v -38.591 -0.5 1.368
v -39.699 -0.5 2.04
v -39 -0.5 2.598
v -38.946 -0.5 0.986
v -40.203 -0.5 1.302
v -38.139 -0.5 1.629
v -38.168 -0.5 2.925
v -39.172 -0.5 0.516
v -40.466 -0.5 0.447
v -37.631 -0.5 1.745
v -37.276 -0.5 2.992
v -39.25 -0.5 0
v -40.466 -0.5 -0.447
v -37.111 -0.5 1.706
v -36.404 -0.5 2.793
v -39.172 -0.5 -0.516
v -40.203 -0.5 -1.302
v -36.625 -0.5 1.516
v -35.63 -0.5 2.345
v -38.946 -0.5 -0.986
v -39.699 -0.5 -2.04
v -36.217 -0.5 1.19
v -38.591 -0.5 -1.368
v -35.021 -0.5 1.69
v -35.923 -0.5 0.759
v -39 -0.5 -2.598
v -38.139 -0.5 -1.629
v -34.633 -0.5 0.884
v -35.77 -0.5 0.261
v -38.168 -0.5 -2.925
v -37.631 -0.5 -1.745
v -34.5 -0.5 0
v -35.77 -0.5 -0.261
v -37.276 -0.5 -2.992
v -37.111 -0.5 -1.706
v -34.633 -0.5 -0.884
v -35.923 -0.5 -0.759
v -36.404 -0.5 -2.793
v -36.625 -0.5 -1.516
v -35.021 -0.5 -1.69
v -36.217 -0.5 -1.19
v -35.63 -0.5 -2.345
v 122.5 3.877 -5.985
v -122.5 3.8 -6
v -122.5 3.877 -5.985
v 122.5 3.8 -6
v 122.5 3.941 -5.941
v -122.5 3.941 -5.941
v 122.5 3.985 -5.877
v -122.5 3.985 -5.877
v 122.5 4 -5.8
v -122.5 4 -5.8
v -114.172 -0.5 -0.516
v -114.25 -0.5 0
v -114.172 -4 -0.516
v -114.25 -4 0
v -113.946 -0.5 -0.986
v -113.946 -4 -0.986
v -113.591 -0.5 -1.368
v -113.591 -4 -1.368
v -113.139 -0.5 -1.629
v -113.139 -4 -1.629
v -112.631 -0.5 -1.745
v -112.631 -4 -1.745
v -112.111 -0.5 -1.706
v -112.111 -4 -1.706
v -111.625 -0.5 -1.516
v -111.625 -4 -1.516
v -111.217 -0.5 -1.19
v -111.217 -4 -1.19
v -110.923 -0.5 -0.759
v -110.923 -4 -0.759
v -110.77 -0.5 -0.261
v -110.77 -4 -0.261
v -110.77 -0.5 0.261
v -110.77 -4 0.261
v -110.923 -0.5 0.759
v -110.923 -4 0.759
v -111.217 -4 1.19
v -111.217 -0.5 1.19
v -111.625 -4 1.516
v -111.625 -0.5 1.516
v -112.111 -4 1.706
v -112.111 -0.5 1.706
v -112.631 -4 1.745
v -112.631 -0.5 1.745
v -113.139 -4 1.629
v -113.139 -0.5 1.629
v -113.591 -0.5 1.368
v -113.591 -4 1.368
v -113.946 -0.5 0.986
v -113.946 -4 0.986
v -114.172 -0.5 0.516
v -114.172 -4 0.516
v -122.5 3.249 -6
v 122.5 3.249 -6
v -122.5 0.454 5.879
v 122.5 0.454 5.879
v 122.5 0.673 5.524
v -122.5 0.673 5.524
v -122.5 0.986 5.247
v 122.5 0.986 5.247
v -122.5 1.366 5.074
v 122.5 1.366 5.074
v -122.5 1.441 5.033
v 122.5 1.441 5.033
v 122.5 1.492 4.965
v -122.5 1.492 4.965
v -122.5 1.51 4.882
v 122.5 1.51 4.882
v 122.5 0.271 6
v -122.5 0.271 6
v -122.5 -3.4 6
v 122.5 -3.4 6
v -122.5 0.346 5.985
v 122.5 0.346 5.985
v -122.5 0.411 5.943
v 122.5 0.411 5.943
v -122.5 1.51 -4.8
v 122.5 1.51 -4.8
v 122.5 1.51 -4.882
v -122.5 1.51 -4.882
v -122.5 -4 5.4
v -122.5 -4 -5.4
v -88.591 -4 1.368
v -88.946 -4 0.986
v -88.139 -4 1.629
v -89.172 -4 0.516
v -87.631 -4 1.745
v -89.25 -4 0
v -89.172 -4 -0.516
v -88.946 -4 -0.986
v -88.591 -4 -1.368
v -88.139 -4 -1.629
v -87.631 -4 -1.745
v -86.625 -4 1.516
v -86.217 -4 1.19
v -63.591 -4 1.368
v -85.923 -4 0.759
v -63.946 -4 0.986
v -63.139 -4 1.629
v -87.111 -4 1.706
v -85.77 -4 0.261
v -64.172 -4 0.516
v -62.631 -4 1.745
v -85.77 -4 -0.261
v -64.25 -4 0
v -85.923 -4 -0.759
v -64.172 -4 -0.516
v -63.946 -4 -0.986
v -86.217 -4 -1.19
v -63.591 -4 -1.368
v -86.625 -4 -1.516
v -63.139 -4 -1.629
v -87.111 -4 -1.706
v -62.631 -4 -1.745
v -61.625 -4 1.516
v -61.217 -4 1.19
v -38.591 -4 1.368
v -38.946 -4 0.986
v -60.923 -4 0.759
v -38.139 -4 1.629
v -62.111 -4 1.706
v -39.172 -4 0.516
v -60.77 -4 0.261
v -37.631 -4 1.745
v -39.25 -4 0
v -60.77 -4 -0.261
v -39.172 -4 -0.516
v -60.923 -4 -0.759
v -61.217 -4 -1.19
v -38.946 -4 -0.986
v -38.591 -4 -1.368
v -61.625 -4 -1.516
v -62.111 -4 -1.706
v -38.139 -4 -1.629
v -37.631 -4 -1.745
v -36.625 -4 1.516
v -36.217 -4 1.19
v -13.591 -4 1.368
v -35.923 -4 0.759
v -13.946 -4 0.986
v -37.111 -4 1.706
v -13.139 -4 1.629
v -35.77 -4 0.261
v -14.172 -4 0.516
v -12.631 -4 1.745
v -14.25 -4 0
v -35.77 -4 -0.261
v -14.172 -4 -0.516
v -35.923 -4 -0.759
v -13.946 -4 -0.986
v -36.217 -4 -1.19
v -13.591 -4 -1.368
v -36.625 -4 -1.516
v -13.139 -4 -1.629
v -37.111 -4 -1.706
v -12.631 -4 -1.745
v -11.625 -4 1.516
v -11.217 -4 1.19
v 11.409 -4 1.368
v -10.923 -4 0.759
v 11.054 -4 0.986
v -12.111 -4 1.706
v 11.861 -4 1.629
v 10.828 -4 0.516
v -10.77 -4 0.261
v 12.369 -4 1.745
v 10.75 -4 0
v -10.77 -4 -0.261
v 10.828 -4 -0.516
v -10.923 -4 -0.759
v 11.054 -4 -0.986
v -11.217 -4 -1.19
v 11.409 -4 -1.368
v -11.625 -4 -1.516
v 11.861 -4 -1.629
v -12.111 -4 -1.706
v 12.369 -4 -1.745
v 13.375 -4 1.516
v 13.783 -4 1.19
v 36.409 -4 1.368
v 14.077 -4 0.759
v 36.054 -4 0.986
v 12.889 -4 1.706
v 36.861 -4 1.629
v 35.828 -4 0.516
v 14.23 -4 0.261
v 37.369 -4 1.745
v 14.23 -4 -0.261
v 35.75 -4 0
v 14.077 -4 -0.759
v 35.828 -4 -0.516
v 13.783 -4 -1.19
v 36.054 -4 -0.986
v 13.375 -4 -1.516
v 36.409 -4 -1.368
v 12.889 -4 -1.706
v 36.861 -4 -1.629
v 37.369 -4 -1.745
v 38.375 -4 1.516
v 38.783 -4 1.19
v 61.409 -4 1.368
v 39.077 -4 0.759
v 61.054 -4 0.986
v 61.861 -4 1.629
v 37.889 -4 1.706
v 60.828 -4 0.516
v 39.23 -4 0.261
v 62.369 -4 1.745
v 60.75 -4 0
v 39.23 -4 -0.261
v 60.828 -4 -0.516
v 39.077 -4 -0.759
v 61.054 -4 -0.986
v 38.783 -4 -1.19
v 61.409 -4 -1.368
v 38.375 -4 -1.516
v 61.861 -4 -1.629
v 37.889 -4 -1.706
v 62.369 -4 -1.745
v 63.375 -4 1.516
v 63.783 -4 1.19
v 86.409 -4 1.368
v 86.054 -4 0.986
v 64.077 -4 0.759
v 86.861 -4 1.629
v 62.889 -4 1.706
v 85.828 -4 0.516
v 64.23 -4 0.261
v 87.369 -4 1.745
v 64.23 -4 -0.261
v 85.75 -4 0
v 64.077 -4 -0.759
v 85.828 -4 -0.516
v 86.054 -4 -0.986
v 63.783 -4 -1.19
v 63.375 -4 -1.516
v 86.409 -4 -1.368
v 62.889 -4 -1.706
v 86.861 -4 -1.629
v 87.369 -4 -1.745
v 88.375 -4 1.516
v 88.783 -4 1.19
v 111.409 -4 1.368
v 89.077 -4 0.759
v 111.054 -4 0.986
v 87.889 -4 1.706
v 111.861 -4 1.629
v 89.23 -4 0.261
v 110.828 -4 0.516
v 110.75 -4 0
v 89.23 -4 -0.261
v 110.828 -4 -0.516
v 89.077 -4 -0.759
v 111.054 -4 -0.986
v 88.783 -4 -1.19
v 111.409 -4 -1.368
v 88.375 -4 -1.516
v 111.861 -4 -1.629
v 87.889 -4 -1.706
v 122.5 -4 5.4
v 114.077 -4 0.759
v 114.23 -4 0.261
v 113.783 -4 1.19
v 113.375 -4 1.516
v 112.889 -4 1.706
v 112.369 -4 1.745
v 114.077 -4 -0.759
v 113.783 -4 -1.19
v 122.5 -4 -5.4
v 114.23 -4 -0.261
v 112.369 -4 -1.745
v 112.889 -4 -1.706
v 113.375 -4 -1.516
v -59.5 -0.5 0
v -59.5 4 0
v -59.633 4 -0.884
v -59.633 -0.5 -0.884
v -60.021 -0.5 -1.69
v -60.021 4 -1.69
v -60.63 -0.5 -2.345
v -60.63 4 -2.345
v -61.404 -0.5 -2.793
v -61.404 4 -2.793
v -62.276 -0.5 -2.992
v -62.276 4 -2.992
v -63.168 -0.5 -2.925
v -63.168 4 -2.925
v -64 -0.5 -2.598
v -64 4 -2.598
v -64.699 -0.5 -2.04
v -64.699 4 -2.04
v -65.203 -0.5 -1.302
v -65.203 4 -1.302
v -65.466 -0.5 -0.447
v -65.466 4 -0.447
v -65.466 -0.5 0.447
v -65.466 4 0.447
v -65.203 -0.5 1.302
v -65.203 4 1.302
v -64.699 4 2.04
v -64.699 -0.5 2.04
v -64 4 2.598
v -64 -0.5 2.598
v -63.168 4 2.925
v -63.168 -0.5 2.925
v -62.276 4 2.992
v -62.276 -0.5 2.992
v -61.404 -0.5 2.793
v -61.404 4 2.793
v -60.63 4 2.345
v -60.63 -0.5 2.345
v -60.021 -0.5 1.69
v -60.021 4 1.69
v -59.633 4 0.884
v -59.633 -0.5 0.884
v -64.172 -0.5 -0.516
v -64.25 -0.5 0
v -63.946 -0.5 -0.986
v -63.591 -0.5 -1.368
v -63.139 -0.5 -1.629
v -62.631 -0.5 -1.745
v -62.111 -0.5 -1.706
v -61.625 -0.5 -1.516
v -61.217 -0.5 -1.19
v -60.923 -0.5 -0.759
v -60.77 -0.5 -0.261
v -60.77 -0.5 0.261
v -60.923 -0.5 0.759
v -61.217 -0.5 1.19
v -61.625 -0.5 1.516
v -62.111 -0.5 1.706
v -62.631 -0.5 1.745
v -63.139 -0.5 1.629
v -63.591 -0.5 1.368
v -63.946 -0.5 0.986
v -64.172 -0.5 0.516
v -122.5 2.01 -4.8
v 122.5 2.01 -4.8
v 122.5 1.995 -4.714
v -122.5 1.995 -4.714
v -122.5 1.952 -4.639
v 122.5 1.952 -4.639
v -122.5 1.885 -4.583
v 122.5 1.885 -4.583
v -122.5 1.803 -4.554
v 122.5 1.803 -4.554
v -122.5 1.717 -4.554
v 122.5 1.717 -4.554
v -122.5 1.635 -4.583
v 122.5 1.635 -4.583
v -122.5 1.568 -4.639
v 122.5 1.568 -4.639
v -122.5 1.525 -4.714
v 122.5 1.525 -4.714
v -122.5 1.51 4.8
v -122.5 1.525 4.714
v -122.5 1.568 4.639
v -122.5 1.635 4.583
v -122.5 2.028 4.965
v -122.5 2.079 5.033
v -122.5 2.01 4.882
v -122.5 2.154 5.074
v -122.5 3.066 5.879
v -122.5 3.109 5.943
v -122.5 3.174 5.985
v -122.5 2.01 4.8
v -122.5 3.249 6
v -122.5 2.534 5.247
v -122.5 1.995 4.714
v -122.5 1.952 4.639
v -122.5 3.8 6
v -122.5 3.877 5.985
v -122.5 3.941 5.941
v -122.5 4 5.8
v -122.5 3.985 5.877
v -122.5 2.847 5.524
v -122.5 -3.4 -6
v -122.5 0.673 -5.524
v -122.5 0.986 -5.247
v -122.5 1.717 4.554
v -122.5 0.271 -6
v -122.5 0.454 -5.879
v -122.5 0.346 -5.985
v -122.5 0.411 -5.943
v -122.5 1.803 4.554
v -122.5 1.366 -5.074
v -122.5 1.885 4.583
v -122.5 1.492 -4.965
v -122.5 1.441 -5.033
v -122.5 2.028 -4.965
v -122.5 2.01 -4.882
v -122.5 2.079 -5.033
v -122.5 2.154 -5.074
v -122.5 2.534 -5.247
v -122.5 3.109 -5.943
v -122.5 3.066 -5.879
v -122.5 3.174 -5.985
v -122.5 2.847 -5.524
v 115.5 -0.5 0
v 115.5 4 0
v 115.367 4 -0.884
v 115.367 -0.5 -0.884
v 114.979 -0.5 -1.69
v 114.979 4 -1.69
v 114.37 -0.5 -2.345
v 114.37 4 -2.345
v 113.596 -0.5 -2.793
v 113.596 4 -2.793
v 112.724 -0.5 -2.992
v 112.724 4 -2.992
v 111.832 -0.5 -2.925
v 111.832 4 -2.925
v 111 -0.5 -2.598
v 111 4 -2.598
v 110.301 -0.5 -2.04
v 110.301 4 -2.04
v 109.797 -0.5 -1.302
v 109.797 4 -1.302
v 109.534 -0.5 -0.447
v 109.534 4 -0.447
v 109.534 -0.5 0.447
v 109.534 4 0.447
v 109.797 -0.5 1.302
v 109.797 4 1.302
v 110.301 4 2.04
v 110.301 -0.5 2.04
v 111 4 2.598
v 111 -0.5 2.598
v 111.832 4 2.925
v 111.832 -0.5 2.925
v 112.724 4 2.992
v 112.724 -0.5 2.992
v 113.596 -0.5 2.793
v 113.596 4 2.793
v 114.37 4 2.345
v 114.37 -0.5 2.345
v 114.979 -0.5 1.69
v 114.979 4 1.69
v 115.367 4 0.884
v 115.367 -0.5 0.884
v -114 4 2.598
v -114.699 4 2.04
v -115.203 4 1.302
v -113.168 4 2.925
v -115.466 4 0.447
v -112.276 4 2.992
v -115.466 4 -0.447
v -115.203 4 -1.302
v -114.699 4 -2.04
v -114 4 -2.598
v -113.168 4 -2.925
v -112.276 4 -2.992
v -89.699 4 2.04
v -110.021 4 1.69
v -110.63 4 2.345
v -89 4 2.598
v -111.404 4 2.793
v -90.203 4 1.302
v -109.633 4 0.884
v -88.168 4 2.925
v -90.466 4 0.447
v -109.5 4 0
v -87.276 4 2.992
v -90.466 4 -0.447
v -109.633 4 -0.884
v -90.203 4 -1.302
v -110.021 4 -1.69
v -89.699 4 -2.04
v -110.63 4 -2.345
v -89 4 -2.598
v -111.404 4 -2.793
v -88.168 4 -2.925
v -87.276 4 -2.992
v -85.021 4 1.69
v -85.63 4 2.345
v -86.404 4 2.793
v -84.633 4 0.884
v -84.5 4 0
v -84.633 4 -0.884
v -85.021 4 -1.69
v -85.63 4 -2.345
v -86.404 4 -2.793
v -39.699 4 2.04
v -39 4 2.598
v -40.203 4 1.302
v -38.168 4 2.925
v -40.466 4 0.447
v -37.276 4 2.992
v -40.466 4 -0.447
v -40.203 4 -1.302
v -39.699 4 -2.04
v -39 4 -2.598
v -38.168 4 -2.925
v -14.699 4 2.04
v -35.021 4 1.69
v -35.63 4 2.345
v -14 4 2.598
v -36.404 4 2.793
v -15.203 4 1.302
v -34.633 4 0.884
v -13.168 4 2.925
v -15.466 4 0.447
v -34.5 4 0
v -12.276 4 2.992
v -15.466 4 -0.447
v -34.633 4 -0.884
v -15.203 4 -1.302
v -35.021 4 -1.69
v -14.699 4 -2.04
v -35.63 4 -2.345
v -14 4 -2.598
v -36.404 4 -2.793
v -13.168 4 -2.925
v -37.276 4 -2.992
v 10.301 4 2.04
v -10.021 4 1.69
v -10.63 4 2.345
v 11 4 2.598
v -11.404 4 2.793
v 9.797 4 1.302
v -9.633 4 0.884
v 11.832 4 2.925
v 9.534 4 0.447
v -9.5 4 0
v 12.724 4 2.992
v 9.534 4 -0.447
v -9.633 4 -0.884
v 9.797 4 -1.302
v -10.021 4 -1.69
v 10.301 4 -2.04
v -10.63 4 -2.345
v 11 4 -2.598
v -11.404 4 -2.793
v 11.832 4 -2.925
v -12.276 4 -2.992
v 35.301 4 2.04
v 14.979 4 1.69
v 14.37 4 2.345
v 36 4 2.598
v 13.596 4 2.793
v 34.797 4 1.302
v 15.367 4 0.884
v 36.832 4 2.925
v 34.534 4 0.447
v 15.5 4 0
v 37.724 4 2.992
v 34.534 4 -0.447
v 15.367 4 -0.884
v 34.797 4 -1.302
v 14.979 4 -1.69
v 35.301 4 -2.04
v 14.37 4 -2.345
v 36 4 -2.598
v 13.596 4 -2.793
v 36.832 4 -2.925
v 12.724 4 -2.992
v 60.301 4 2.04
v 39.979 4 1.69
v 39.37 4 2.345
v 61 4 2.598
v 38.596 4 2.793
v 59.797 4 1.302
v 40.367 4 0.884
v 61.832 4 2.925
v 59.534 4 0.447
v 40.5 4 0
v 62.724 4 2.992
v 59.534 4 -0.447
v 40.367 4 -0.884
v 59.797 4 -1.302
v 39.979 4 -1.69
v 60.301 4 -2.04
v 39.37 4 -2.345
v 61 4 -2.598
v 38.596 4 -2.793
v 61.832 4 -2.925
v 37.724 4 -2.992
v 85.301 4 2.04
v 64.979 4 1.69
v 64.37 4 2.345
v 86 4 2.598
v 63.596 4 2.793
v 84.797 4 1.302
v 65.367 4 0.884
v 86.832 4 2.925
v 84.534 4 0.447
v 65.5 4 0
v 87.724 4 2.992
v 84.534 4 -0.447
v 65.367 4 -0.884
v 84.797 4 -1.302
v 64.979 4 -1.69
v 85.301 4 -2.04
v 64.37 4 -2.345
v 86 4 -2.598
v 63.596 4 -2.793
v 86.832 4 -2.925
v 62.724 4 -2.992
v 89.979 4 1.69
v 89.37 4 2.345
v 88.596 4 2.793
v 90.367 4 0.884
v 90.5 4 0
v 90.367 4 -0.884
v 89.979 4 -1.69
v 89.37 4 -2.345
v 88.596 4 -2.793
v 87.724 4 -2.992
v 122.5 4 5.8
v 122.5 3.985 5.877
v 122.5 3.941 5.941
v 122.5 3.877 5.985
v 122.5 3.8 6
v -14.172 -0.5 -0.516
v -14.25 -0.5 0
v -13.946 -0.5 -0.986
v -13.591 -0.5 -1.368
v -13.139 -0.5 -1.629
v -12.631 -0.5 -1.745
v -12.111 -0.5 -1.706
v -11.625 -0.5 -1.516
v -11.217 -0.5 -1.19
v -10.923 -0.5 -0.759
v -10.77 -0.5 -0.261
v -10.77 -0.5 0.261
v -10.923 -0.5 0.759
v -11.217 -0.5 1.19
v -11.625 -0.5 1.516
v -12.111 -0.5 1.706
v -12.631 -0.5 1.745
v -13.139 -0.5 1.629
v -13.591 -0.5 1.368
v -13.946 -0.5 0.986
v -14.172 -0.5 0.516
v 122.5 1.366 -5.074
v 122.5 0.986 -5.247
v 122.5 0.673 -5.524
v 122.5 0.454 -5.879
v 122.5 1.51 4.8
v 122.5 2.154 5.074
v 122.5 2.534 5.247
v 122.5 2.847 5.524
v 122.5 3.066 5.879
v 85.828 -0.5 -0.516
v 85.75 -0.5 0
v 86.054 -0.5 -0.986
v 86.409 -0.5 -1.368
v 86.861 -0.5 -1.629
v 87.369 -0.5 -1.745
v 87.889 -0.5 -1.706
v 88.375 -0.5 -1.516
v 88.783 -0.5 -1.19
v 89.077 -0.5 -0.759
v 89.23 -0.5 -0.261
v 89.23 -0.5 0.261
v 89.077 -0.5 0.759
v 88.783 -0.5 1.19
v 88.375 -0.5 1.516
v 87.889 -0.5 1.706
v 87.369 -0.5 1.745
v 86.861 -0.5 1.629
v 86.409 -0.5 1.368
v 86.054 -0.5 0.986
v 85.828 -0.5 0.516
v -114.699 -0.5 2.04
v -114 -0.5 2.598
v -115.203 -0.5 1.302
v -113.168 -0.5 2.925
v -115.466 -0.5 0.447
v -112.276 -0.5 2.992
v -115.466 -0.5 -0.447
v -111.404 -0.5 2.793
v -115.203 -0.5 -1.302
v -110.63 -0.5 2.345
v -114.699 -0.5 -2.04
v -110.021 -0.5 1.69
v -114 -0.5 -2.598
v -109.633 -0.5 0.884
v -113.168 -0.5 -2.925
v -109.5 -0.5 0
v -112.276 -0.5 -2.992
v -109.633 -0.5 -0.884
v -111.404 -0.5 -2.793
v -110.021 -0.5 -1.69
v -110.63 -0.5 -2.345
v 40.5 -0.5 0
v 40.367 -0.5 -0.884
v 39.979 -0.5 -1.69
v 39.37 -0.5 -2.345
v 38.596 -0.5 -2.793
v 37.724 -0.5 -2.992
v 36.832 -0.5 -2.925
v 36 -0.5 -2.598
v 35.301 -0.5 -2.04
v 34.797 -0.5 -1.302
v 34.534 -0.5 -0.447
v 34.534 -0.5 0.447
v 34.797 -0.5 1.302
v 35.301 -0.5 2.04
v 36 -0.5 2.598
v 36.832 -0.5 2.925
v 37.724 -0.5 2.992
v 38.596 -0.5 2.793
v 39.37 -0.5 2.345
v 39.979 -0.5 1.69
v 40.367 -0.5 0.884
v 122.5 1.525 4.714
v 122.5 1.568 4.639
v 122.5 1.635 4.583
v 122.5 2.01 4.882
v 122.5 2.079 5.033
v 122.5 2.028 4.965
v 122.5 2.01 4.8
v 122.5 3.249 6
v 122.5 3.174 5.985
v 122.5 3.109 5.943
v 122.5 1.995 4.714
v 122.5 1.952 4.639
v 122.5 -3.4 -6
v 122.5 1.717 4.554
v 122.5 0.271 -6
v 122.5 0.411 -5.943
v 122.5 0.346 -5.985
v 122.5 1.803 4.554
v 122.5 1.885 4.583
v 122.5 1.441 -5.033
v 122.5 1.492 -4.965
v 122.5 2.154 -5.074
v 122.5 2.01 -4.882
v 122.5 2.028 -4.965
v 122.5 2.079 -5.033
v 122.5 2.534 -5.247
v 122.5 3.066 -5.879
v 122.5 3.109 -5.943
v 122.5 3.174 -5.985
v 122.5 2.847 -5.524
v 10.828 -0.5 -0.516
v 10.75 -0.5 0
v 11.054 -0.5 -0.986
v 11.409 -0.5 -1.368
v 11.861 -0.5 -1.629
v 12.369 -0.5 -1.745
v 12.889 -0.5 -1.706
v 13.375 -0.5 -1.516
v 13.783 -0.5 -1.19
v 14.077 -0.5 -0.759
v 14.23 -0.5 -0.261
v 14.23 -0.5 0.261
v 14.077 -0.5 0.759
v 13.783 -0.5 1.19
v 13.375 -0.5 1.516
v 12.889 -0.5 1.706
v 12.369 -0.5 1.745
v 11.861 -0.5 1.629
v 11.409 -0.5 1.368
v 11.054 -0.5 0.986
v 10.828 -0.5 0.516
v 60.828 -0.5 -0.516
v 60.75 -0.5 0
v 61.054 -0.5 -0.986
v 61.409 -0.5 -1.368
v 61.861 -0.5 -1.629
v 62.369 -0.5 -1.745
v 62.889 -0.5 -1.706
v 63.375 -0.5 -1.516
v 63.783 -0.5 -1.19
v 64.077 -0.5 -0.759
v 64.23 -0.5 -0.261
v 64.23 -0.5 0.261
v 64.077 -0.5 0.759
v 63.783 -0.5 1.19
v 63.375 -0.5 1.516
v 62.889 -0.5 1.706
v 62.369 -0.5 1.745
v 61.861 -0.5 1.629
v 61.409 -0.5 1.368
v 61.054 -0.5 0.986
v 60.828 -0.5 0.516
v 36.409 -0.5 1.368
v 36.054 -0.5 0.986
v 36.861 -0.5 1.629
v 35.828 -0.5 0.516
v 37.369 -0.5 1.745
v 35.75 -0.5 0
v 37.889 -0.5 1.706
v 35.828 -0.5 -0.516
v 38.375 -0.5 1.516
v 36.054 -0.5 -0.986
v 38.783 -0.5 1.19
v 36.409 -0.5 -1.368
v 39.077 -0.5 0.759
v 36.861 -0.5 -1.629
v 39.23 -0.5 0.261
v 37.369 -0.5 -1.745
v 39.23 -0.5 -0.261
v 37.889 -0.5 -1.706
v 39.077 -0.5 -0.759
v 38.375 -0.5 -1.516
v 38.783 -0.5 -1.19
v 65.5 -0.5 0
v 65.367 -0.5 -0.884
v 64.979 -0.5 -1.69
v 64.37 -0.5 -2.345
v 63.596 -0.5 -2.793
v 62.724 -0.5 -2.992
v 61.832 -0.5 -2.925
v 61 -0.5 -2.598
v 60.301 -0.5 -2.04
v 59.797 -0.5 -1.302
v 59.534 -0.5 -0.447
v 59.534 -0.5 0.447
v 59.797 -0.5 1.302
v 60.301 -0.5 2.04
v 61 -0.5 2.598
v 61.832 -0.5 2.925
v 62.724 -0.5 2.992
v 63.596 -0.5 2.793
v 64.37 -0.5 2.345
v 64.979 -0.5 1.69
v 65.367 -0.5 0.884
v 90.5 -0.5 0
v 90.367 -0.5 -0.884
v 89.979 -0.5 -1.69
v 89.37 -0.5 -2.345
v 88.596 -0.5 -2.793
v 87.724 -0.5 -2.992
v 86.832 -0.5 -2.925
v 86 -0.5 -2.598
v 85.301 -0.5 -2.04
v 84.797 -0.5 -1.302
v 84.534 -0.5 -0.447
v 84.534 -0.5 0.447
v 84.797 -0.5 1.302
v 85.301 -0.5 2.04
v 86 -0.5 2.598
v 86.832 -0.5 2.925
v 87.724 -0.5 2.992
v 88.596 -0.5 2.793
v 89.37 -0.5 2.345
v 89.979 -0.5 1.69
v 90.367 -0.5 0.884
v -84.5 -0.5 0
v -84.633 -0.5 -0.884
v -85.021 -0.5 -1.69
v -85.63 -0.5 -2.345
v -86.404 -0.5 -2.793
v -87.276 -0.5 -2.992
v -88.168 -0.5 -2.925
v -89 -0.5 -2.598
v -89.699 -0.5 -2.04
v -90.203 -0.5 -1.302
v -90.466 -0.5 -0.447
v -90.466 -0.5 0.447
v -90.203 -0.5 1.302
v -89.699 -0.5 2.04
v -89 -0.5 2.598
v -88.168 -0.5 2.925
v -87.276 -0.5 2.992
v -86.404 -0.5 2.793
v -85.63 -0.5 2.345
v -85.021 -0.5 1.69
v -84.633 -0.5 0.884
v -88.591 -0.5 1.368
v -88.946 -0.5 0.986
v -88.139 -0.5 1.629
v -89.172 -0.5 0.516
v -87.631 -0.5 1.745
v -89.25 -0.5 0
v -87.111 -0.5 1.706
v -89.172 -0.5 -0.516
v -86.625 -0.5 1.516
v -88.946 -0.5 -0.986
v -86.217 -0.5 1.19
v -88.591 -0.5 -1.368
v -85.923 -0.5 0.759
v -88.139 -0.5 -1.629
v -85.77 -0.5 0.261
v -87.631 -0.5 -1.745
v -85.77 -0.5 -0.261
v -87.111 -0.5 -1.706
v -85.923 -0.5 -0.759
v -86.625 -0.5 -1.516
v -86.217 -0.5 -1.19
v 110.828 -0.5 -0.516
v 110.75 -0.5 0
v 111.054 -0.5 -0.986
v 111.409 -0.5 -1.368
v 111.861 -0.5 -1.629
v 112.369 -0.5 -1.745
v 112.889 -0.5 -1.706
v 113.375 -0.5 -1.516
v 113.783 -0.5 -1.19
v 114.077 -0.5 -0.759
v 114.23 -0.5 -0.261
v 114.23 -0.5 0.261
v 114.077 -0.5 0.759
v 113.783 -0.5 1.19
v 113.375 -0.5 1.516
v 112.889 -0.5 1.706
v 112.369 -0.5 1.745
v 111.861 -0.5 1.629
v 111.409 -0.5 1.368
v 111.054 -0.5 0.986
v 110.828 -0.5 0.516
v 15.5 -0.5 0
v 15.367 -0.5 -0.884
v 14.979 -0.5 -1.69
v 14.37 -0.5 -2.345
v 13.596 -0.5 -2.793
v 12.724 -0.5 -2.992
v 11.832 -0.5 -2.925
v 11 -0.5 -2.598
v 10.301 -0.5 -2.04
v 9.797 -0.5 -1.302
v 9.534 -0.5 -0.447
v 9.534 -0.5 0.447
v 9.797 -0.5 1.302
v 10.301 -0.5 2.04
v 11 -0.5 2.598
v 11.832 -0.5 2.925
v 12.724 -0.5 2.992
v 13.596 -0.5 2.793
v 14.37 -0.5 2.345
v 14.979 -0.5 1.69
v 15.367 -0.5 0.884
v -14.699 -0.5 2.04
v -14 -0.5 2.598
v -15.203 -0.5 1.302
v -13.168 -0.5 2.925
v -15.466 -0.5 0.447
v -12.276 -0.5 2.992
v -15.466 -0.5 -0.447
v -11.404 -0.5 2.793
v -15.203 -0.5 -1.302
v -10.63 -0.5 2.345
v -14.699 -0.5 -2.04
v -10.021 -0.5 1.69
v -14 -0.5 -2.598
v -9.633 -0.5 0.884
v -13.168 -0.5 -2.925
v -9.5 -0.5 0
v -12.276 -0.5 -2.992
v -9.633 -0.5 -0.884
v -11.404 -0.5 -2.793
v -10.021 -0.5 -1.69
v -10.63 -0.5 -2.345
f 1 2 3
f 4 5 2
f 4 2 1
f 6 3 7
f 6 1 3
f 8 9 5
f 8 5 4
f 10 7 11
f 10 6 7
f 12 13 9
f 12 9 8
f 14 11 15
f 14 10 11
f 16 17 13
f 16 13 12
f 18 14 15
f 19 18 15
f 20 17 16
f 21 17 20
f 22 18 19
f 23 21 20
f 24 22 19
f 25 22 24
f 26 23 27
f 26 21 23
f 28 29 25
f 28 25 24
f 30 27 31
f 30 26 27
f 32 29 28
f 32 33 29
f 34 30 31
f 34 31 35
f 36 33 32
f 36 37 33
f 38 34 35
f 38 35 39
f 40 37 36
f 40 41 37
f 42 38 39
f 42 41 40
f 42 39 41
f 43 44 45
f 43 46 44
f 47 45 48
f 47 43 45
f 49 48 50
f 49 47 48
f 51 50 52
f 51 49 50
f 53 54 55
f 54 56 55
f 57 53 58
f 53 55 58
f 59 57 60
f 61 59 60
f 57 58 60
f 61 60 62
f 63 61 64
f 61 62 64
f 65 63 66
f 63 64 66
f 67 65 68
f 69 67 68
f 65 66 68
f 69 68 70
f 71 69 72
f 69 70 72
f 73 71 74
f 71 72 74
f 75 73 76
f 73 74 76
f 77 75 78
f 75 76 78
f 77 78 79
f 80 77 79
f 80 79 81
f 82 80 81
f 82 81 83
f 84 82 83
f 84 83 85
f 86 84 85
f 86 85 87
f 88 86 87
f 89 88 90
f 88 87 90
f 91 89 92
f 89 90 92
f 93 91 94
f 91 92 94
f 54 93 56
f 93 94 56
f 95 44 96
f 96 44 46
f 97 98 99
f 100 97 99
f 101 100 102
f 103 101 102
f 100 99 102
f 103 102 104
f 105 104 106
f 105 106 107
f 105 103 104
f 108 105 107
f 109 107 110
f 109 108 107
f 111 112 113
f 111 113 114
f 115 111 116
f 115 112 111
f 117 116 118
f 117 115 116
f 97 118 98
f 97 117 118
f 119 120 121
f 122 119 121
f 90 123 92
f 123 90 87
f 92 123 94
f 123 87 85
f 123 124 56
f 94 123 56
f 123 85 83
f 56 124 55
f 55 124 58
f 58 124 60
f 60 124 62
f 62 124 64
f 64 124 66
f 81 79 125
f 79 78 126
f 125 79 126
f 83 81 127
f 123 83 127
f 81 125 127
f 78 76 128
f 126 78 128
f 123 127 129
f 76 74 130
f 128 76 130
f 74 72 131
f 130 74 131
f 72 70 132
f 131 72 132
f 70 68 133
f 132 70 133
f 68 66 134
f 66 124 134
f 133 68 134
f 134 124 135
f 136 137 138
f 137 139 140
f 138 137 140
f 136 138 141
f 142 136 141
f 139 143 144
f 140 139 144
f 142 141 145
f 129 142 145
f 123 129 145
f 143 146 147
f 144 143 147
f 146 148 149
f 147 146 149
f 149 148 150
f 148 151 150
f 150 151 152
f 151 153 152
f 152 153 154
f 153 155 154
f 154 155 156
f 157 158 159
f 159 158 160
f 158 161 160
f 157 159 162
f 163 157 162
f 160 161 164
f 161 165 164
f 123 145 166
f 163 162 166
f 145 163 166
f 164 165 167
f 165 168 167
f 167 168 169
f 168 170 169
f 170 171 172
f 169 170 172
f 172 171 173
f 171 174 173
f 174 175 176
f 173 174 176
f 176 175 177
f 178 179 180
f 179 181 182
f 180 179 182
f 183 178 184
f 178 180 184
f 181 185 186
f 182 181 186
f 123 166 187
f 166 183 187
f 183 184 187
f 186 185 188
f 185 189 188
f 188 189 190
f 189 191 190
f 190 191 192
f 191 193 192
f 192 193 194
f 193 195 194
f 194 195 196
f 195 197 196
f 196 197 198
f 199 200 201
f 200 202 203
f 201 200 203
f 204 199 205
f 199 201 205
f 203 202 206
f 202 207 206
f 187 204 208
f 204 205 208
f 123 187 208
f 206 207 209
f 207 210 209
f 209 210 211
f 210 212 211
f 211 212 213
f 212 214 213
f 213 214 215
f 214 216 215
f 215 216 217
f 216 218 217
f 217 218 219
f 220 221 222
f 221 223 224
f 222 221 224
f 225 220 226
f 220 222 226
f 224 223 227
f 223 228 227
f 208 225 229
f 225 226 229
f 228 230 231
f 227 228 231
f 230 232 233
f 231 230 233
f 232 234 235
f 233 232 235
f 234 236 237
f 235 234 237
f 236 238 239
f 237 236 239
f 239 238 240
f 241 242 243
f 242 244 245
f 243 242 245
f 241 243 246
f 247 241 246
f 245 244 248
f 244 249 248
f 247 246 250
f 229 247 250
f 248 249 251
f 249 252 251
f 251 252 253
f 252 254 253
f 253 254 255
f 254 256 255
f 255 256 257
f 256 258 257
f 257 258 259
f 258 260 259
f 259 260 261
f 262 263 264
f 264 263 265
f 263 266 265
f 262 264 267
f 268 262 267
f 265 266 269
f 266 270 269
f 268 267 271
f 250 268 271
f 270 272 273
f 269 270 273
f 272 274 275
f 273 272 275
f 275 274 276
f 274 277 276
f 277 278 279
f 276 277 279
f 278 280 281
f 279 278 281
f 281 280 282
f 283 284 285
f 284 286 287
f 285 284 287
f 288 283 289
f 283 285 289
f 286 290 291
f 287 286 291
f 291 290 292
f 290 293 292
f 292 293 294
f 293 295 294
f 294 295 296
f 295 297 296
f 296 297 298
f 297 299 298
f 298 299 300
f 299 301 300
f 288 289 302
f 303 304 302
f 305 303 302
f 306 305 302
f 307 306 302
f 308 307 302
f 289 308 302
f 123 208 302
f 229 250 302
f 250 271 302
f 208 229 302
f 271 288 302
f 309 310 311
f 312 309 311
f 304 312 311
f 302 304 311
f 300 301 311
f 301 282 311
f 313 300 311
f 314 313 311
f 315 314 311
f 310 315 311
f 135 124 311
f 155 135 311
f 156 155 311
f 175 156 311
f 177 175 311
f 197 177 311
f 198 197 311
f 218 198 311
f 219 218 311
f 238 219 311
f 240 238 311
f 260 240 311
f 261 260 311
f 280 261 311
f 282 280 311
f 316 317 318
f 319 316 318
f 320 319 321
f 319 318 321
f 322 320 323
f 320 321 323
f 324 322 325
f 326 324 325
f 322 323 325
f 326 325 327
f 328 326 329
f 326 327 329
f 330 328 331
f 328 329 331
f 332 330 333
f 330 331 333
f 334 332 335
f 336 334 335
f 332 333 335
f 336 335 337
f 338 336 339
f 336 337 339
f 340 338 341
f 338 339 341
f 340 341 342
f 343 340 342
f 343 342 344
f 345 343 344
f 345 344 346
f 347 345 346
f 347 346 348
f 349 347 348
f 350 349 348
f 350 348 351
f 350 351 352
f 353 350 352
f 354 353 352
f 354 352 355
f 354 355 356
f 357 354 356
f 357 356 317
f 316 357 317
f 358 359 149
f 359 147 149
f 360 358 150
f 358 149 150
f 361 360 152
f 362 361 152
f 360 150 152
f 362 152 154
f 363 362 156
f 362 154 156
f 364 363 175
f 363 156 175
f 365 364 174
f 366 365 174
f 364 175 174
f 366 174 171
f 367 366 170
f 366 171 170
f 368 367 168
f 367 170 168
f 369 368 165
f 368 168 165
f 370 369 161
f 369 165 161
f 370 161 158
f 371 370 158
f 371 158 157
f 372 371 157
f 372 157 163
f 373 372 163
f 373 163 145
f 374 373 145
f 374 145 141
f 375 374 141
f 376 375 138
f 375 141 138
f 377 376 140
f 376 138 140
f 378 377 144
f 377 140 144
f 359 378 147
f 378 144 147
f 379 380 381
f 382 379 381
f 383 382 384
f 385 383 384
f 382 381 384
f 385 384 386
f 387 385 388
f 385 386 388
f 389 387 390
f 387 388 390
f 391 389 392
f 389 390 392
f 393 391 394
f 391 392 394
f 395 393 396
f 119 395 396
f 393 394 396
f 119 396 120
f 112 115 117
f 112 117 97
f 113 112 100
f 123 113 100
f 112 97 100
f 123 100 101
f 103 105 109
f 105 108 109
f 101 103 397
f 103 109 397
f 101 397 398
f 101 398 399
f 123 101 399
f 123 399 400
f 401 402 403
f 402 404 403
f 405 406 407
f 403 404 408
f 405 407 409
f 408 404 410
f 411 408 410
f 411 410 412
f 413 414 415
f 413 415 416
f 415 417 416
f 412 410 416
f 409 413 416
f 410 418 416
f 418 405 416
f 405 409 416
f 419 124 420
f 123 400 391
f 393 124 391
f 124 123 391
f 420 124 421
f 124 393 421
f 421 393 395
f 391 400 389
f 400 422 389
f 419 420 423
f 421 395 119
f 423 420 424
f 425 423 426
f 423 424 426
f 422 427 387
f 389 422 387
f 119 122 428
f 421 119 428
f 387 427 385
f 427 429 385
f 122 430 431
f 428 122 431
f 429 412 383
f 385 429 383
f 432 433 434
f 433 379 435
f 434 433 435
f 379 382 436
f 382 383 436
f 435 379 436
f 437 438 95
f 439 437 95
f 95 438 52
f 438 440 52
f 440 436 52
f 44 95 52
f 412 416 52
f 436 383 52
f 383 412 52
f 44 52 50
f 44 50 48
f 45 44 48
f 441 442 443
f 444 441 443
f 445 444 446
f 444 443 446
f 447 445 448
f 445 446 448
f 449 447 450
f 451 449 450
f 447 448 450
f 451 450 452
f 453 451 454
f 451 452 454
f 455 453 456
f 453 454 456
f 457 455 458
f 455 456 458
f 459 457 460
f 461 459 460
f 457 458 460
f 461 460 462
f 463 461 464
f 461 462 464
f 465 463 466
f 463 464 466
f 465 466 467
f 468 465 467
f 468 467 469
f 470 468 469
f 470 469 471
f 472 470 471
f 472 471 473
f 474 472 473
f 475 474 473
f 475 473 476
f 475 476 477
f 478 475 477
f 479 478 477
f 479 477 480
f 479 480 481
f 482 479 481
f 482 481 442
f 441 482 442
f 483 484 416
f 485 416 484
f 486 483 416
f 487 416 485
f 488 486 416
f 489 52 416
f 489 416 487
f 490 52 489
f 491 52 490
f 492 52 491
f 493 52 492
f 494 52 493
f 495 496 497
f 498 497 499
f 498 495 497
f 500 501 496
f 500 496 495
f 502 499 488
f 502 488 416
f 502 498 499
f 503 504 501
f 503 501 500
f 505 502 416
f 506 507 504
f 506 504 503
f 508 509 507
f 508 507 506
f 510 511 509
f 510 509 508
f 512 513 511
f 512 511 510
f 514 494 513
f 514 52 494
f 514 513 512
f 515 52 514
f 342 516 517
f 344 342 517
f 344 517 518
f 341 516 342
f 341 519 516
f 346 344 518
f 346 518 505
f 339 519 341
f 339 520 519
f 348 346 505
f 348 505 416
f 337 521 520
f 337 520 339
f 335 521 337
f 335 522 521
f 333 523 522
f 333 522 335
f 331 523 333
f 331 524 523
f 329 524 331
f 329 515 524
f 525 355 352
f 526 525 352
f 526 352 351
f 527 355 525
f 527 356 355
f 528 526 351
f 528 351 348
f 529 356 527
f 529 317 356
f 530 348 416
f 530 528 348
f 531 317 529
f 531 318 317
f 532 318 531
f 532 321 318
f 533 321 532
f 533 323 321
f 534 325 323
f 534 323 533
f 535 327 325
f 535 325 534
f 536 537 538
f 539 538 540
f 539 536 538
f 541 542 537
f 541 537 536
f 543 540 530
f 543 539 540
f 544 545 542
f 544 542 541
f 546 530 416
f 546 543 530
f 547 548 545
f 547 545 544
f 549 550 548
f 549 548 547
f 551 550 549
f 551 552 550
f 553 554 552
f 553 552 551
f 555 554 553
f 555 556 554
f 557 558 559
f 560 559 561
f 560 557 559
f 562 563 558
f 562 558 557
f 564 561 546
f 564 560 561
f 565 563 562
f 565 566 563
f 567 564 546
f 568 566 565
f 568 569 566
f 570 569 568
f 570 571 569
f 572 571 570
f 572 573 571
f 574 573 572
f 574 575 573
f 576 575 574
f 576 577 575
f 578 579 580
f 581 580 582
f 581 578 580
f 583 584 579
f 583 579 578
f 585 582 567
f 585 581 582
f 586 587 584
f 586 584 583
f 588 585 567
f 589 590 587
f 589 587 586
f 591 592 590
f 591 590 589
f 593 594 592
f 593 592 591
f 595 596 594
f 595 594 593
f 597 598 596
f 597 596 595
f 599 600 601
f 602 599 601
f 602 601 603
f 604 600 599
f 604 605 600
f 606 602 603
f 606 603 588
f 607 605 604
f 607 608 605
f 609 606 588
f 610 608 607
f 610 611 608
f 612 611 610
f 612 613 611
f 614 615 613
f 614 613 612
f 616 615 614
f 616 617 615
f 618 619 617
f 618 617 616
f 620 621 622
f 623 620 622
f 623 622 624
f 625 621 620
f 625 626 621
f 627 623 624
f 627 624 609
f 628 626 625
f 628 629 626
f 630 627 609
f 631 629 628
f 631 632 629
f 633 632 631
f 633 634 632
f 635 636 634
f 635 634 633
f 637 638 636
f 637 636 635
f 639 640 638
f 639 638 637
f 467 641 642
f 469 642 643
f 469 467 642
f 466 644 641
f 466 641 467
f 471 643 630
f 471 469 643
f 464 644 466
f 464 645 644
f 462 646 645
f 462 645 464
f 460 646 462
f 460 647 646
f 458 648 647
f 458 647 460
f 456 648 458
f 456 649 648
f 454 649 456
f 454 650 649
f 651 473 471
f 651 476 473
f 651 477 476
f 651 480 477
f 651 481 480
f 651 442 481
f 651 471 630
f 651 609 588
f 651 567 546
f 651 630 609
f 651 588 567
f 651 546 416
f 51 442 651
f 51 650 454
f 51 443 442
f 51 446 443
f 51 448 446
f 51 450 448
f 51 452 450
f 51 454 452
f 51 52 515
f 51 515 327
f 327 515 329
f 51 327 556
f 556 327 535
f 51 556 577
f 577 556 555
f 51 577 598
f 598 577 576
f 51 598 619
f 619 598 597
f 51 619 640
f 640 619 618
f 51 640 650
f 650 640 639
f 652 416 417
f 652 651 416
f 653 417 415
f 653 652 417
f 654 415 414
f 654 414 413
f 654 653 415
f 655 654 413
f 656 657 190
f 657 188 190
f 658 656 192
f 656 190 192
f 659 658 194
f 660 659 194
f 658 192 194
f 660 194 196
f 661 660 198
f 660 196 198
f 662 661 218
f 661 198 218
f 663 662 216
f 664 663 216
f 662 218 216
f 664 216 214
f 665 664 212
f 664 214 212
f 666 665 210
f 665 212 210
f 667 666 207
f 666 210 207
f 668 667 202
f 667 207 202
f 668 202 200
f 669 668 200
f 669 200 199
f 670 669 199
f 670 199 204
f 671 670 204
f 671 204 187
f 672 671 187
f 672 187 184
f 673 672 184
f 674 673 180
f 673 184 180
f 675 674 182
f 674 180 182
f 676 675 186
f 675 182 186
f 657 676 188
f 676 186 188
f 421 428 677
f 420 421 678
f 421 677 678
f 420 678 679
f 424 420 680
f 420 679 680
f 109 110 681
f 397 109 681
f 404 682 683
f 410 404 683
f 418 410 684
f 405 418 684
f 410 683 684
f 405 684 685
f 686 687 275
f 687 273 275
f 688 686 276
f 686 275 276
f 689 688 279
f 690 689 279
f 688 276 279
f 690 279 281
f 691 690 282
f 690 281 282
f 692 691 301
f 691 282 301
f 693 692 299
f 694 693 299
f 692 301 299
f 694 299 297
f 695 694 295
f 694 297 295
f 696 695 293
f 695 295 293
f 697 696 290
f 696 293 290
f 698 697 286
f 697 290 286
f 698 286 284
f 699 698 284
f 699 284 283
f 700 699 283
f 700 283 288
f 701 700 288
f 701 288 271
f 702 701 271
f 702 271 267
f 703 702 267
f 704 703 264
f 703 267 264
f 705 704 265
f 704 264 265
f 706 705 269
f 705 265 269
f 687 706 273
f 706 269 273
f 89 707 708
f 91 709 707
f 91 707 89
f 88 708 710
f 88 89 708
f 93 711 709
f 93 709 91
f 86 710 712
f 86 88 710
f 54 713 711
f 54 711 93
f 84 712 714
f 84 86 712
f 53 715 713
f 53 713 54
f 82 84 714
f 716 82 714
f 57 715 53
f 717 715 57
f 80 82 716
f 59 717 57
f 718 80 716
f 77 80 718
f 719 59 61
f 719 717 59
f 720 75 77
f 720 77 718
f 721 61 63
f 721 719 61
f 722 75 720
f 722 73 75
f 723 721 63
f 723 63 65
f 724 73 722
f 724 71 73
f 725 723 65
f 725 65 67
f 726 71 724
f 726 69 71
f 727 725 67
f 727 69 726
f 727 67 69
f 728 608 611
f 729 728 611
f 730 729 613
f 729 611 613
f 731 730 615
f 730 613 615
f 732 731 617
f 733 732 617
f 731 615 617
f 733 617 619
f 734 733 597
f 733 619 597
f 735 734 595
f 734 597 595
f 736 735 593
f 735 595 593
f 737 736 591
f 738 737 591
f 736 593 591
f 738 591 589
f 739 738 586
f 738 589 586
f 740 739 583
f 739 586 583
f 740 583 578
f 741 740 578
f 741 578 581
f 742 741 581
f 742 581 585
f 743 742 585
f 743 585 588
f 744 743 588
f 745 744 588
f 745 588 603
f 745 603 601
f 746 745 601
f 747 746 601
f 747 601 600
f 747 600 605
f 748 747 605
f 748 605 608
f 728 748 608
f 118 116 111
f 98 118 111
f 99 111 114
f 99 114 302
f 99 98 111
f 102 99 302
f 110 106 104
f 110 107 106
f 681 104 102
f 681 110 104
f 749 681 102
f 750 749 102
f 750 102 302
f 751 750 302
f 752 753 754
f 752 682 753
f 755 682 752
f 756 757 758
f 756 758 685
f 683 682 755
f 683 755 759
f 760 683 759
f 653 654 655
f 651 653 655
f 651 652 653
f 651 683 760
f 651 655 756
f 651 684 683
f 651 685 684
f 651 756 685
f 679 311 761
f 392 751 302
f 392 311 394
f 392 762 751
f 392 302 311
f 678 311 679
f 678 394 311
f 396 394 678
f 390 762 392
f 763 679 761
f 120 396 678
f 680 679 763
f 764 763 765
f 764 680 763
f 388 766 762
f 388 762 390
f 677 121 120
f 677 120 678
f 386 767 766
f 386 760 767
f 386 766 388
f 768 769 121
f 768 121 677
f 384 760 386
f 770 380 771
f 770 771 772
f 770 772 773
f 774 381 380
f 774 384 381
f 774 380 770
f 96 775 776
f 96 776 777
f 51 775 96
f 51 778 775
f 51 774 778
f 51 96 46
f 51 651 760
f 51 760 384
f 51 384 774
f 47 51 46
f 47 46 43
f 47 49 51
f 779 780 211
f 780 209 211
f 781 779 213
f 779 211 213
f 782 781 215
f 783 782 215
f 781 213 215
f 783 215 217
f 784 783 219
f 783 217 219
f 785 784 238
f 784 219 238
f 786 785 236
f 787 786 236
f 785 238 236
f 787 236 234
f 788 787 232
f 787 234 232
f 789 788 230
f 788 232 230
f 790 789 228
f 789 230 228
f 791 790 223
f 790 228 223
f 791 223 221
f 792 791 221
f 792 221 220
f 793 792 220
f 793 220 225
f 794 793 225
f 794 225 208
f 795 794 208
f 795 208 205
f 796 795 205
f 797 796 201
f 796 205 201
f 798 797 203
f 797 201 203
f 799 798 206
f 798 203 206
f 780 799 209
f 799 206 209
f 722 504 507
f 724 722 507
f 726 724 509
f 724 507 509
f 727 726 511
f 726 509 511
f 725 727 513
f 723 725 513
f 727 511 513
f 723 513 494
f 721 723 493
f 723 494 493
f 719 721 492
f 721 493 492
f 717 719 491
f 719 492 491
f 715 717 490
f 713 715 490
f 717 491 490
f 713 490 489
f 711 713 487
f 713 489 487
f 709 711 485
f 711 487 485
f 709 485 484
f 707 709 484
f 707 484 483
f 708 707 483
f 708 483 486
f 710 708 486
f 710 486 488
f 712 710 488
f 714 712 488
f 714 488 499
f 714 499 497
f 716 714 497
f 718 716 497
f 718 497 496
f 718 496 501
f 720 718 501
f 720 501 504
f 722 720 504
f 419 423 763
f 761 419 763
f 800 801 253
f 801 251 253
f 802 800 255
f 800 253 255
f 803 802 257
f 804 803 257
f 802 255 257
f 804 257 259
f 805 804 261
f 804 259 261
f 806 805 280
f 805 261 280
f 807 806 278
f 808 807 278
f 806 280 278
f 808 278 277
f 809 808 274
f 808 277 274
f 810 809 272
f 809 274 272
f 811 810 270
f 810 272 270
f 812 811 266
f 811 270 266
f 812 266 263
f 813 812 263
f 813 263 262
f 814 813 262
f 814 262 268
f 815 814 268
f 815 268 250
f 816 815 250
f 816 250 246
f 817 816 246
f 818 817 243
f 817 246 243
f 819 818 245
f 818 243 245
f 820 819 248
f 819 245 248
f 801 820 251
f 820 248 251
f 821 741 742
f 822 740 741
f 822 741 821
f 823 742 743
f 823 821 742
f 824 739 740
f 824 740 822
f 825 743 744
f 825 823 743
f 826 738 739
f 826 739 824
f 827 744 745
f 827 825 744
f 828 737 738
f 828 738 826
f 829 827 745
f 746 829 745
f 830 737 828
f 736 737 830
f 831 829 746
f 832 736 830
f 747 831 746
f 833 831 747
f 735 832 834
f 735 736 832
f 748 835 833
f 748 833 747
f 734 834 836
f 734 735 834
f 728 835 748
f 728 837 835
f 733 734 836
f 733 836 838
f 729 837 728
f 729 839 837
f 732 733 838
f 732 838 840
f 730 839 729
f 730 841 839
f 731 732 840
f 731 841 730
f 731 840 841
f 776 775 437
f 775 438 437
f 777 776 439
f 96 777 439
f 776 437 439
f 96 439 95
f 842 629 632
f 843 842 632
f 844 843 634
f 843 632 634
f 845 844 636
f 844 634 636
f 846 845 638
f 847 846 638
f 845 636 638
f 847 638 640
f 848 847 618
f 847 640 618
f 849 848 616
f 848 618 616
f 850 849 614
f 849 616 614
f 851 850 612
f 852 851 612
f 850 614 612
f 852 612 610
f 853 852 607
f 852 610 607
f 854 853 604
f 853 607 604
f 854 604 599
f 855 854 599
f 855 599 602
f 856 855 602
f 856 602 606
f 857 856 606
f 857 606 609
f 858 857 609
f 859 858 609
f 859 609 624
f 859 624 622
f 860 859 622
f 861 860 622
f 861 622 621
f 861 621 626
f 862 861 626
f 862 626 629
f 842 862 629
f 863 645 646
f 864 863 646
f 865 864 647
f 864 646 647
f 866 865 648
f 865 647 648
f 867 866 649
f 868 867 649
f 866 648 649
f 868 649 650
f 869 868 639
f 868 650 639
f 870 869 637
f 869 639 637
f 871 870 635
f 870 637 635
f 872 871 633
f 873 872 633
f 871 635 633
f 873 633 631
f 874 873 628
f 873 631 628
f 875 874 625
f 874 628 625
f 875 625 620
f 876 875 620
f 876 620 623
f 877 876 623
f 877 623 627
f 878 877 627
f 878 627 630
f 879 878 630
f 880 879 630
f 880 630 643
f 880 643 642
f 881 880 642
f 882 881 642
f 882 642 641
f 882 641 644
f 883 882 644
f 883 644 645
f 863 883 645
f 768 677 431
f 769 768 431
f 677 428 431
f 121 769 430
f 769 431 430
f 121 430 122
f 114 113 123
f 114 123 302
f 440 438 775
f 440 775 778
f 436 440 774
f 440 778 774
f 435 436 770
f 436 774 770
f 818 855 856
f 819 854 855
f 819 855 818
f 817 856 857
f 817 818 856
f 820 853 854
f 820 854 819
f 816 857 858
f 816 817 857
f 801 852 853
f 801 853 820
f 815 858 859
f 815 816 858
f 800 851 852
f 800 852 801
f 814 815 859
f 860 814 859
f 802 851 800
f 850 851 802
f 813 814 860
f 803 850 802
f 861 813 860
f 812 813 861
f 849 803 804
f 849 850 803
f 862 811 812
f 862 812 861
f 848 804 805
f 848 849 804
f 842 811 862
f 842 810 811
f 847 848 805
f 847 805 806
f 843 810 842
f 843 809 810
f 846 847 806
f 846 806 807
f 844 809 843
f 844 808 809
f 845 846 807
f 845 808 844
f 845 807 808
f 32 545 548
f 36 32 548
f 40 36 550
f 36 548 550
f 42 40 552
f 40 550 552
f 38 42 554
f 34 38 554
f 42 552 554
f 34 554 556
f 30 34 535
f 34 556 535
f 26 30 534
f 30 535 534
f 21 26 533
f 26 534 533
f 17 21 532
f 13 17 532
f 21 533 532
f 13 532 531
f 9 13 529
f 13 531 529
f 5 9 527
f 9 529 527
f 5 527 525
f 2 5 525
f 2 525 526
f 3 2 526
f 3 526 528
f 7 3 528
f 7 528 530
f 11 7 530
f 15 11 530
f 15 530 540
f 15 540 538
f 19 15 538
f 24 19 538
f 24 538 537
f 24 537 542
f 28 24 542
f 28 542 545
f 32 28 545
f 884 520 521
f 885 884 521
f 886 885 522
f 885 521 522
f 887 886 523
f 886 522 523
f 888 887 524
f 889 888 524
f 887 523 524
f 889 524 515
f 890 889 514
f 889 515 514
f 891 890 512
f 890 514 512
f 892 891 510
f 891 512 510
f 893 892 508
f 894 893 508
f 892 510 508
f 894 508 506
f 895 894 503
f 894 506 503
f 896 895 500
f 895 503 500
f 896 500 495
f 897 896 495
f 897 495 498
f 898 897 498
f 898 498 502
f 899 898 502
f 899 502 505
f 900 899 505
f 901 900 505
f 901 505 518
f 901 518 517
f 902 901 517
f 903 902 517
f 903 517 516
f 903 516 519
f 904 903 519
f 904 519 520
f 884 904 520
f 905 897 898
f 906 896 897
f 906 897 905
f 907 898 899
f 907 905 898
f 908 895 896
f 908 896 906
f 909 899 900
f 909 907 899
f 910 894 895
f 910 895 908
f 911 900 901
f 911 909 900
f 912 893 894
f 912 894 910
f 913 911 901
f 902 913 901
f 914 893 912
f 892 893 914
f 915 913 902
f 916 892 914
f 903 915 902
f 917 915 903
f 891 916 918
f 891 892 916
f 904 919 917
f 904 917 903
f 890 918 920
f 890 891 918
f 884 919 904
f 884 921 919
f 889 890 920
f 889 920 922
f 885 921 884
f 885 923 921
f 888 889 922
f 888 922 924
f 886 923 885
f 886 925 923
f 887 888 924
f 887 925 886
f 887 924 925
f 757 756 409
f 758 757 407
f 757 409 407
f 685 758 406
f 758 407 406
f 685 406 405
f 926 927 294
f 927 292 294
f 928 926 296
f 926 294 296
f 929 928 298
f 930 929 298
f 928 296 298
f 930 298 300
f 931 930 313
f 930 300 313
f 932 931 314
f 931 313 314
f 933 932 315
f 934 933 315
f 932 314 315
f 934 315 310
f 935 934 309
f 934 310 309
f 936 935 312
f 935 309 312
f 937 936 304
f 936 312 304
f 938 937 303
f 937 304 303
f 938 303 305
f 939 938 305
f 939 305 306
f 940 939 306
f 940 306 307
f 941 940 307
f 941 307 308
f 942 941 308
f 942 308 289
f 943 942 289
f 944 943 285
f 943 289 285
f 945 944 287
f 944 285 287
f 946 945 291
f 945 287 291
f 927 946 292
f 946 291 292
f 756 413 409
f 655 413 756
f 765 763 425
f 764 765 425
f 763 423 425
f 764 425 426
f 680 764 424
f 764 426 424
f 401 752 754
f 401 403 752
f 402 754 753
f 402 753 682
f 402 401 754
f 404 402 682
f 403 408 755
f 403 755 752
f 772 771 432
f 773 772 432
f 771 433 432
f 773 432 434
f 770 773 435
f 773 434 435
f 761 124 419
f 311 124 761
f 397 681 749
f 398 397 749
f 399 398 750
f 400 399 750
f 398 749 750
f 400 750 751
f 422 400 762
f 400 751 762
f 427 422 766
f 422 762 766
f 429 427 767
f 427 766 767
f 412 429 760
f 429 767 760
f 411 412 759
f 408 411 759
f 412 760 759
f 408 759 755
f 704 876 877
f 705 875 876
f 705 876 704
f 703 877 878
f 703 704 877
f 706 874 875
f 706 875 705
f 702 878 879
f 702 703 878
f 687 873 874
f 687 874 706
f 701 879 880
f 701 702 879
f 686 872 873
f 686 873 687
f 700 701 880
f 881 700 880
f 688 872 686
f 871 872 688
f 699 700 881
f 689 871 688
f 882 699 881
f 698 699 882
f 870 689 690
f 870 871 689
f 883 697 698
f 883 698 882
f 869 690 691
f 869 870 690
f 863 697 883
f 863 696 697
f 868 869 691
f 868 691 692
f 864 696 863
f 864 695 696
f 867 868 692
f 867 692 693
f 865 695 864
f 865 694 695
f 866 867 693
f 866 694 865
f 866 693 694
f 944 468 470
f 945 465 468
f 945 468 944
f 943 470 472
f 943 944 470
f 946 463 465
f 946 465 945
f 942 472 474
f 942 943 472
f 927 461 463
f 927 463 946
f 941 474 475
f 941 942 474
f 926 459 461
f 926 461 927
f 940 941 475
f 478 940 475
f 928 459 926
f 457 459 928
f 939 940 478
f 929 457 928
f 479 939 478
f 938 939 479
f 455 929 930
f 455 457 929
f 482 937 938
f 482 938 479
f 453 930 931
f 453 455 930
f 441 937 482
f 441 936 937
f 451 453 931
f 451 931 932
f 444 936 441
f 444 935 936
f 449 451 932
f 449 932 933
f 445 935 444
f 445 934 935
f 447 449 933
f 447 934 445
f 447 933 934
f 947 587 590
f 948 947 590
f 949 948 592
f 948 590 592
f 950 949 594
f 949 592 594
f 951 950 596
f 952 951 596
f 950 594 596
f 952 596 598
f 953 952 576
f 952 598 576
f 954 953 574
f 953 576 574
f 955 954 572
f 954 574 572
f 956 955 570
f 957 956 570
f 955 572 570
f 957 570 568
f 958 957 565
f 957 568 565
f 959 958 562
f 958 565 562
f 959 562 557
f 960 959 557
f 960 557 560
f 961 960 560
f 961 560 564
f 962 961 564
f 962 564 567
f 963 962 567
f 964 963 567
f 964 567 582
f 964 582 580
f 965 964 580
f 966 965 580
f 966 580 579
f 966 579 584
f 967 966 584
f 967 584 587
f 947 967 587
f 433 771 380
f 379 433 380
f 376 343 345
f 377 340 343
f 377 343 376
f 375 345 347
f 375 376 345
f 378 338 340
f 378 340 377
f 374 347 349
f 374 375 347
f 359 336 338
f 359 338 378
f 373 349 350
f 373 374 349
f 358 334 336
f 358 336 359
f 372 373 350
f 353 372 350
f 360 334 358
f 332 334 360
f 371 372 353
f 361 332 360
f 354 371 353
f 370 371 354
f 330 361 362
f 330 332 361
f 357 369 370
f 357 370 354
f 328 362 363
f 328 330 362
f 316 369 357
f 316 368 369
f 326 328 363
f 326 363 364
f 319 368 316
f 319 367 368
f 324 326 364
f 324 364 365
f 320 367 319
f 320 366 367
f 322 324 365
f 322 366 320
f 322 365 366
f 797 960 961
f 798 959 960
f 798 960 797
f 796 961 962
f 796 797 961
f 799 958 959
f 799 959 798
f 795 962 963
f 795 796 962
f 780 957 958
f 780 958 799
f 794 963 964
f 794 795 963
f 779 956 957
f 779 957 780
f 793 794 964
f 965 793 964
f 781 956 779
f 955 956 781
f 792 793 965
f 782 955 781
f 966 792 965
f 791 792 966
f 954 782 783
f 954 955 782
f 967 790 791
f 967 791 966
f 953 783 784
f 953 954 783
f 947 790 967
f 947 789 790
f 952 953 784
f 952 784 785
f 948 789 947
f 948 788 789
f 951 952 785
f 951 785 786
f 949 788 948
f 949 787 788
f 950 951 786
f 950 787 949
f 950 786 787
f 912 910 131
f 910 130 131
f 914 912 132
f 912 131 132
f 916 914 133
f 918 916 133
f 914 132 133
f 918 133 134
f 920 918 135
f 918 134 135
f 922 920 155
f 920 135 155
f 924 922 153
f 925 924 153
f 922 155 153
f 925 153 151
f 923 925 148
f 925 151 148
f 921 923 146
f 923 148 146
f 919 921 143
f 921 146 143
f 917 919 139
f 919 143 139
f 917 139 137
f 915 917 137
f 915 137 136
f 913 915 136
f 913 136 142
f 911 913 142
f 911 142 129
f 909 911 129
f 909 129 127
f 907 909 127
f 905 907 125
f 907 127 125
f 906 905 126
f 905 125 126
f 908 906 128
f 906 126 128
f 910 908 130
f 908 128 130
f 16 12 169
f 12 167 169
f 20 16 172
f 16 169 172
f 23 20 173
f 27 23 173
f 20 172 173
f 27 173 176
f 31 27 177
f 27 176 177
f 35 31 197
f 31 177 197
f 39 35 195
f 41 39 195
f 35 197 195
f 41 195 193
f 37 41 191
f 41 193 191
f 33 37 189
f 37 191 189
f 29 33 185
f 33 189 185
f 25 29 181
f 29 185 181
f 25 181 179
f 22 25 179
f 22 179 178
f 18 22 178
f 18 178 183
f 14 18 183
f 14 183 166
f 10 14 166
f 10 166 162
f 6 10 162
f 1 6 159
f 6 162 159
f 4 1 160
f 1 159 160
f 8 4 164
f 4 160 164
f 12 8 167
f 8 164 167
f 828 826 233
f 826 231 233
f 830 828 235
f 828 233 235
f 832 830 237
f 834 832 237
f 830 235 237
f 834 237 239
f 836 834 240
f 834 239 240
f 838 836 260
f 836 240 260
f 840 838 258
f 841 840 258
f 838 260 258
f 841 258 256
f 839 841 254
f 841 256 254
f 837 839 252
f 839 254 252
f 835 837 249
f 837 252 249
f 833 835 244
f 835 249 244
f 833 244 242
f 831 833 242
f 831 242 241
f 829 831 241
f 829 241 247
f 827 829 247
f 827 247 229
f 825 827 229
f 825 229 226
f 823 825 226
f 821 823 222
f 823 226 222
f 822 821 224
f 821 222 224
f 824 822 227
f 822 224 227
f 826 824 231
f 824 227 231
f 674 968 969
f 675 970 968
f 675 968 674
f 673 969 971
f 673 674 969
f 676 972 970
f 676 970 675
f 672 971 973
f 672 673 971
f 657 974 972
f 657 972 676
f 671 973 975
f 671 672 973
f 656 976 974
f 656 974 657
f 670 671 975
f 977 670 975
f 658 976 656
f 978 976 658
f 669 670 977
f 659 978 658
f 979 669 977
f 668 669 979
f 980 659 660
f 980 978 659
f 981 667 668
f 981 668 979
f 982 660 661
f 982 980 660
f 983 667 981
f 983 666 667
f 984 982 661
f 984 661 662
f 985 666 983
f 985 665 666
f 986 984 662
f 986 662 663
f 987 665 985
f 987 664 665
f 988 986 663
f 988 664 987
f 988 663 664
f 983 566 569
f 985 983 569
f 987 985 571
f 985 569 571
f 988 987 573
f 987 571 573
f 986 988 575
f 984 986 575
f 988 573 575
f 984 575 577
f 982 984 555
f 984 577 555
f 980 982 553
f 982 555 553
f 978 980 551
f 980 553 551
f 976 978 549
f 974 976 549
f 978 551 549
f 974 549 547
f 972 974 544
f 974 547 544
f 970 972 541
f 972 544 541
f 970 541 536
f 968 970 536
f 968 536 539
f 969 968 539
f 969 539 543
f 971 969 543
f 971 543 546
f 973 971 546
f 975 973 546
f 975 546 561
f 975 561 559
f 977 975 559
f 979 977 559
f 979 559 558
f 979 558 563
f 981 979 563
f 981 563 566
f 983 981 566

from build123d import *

# Parameters (mm, degrees)
SKETCH_1_W                   = 245
SKETCH_1_H                   = 12
EXTRUDE_1_DEPTH              = 8
CUT_EXTRUDE_1_DEPTH          = 246.106099475
CUT_EXTRUDE_2_DEPTH          = 246.106099475
CUT_EXTRUDE_3_DEPTH          = 246.106099475
CUT_EXTRUDE_4_DEPTH          = 246.106099475
CUT_EXTRUDE_5_DEPTH          = 246.106099475
CUT_EXTRUDE_6_DEPTH          = 246.106099475
HOLE_WIZARD_M3_1_D           = 3.5
HOLE_WIZARD_M3_1_CBORE_D     = 5.9999
HOLE_WIZARD_M3_1_CBORE_DEPTH = 4.5
CHAMFER_1_SIZE               = 0.6
FILLET_1_R                   = 0.2


with BuildPart() as part:
    # 草图1 → 凸台-拉伸1 (new body)
    with BuildSketch(Plane(origin=(0, 4, 0), x_dir=(1, 0, 0), z_dir=(0, 1, 0))):
        Rectangle(SKETCH_1_W, SKETCH_1_H)
    extrude(amount=-EXTRUDE_1_DEPTH)

    # 草图2 → 切除-拉伸1 (cut, through all)
    with BuildSketch(Plane(origin=(122.5, 0, 0), x_dir=(0, 0, -1), z_dir=(1, 0, 0))):
        with BuildLine():
            Line((6, 1.51), (6, 2.01))
            Line((6, 2.01), (4.8, 2.01))
            ThreePointArc((4.8, 2.01), (4.55, 1.76), (4.8, 1.51))
            Line((4.8, 1.51), (6, 1.51))
        make_face()
    extrude(amount=-CUT_EXTRUDE_1_DEPTH, mode=Mode.SUBTRACT)

    # 草图3 → 切除-拉伸2 (cut, through all)
    with BuildSketch(Plane(origin=(122.5, 0, 0), x_dir=(0, 0, -1), z_dir=(1, 0, 0))):
        with BuildLine():
            Line((6, 2.01), (6, 3.111111))
            ThreePointArc((6, 3.111111), (5.367595703, 2.693428684), (5.04, 2.01))
            Line((5.04, 2.01), (6, 2.01))
        make_face()
    extrude(amount=-CUT_EXTRUDE_2_DEPTH, mode=Mode.SUBTRACT)

    # 草图4 → 切除-拉伸3 (cut, through all)
    with BuildSketch(Plane(origin=(122.5, 0, 0), x_dir=(0, 0, -1), z_dir=(1, 0, 0))):
        with BuildLine():
            Line((6, 1.51), (5.04, 1.51))
            ThreePointArc((5.04, 1.51), (5.367595703, 0.826571316), (6, 0.408889))
            Line((6, 0.408889), (6, 1.51))
        make_face()
    extrude(amount=-CUT_EXTRUDE_3_DEPTH, mode=Mode.SUBTRACT)

    # 草图5 → 切除-拉伸4 (cut, through all)
    with BuildSketch(Plane(origin=(122.5, 0, 0), x_dir=(0, 0, -1), z_dir=(1, 0, 0))):
        with BuildLine():
            Line((-6, 2.01), (-6, 1.51))
            Line((-6, 1.51), (-4.8, 1.51))
            ThreePointArc((-4.8, 1.51), (-4.55, 1.76), (-4.8, 2.01))
            Line((-4.8, 2.01), (-6, 2.01))
        make_face()
    extrude(amount=-CUT_EXTRUDE_4_DEPTH, mode=Mode.SUBTRACT)

    # 草图6 → 切除-拉伸5 (cut, through all)
    with BuildSketch(Plane(origin=(122.5, 0, 0), x_dir=(0, 0, -1), z_dir=(1, 0, 0))):
        with BuildLine():
            Line((-6, 1.51), (-6, 0.408889))
            ThreePointArc((-6, 0.408889), (-5.367595703, 0.826571316), (-5.04, 1.51))
            Line((-5.04, 1.51), (-6, 1.51))
        make_face()
    extrude(amount=-CUT_EXTRUDE_5_DEPTH, mode=Mode.SUBTRACT)

    # 草图7 → 切除-拉伸6 (cut, through all)
    with BuildSketch(Plane(origin=(122.5, 0, 0), x_dir=(0, 0, -1), z_dir=(1, 0, 0))):
        with BuildLine():
            Line((-6, 2.01), (-5.04, 2.01))
            ThreePointArc((-5.04, 2.01), (-5.367595703, 2.693428684), (-6, 3.111111))
            Line((-6, 3.111111), (-6, 2.01))
        make_face()
    extrude(amount=-CUT_EXTRUDE_6_DEPTH, mode=Mode.SUBTRACT)

    # M3 六角头机械螺钉的柱形沉头孔1 (through all)
    with Locations(Plane(origin=(0, 4, 0), x_dir=(1, 0, 0), z_dir=(0, 1, 0))):
        with Locations((-112.5, 0), (-87.5, 0), (-62.5, 0), (-37.5, 0), (-12.5, 0), (12.5, 0), (37.5, 0), (62.5, 0), (87.5, 0), (112.5, 0)):
            CounterBoreHole(HOLE_WIZARD_M3_1_D / 2, HOLE_WIZARD_M3_1_CBORE_D / 2, HOLE_WIZARD_M3_1_CBORE_DEPTH)

    # 倒角1
    chamfer_1_edges = [part.edges().sort_by_distance(p)[0] for p in [
        (0, -4, -6),
        (0, -4, 6),
    ]]
    chamfer(chamfer_1_edges, length=CHAMFER_1_SIZE)

    # 圆角1
    fillet_1_edges = [part.edges().sort_by_distance(p)[0] for p in [
        (0, 2.01, -5.04),
        (0, 3.111111, -6),
        (0, 0.408889, -6),
        (0, 1.51, -5.04),
        (0, 4, -6),
        (0, 4, 6),
        (0, 1.51, 5.04),
        (0, 0.408889, 6),
        (0, 3.111111, 6),
        (0, 2.01, 5.04),
    ]]
    fillet(fillet_1_edges, radius=FILLET_1_R)


solid = part.part
